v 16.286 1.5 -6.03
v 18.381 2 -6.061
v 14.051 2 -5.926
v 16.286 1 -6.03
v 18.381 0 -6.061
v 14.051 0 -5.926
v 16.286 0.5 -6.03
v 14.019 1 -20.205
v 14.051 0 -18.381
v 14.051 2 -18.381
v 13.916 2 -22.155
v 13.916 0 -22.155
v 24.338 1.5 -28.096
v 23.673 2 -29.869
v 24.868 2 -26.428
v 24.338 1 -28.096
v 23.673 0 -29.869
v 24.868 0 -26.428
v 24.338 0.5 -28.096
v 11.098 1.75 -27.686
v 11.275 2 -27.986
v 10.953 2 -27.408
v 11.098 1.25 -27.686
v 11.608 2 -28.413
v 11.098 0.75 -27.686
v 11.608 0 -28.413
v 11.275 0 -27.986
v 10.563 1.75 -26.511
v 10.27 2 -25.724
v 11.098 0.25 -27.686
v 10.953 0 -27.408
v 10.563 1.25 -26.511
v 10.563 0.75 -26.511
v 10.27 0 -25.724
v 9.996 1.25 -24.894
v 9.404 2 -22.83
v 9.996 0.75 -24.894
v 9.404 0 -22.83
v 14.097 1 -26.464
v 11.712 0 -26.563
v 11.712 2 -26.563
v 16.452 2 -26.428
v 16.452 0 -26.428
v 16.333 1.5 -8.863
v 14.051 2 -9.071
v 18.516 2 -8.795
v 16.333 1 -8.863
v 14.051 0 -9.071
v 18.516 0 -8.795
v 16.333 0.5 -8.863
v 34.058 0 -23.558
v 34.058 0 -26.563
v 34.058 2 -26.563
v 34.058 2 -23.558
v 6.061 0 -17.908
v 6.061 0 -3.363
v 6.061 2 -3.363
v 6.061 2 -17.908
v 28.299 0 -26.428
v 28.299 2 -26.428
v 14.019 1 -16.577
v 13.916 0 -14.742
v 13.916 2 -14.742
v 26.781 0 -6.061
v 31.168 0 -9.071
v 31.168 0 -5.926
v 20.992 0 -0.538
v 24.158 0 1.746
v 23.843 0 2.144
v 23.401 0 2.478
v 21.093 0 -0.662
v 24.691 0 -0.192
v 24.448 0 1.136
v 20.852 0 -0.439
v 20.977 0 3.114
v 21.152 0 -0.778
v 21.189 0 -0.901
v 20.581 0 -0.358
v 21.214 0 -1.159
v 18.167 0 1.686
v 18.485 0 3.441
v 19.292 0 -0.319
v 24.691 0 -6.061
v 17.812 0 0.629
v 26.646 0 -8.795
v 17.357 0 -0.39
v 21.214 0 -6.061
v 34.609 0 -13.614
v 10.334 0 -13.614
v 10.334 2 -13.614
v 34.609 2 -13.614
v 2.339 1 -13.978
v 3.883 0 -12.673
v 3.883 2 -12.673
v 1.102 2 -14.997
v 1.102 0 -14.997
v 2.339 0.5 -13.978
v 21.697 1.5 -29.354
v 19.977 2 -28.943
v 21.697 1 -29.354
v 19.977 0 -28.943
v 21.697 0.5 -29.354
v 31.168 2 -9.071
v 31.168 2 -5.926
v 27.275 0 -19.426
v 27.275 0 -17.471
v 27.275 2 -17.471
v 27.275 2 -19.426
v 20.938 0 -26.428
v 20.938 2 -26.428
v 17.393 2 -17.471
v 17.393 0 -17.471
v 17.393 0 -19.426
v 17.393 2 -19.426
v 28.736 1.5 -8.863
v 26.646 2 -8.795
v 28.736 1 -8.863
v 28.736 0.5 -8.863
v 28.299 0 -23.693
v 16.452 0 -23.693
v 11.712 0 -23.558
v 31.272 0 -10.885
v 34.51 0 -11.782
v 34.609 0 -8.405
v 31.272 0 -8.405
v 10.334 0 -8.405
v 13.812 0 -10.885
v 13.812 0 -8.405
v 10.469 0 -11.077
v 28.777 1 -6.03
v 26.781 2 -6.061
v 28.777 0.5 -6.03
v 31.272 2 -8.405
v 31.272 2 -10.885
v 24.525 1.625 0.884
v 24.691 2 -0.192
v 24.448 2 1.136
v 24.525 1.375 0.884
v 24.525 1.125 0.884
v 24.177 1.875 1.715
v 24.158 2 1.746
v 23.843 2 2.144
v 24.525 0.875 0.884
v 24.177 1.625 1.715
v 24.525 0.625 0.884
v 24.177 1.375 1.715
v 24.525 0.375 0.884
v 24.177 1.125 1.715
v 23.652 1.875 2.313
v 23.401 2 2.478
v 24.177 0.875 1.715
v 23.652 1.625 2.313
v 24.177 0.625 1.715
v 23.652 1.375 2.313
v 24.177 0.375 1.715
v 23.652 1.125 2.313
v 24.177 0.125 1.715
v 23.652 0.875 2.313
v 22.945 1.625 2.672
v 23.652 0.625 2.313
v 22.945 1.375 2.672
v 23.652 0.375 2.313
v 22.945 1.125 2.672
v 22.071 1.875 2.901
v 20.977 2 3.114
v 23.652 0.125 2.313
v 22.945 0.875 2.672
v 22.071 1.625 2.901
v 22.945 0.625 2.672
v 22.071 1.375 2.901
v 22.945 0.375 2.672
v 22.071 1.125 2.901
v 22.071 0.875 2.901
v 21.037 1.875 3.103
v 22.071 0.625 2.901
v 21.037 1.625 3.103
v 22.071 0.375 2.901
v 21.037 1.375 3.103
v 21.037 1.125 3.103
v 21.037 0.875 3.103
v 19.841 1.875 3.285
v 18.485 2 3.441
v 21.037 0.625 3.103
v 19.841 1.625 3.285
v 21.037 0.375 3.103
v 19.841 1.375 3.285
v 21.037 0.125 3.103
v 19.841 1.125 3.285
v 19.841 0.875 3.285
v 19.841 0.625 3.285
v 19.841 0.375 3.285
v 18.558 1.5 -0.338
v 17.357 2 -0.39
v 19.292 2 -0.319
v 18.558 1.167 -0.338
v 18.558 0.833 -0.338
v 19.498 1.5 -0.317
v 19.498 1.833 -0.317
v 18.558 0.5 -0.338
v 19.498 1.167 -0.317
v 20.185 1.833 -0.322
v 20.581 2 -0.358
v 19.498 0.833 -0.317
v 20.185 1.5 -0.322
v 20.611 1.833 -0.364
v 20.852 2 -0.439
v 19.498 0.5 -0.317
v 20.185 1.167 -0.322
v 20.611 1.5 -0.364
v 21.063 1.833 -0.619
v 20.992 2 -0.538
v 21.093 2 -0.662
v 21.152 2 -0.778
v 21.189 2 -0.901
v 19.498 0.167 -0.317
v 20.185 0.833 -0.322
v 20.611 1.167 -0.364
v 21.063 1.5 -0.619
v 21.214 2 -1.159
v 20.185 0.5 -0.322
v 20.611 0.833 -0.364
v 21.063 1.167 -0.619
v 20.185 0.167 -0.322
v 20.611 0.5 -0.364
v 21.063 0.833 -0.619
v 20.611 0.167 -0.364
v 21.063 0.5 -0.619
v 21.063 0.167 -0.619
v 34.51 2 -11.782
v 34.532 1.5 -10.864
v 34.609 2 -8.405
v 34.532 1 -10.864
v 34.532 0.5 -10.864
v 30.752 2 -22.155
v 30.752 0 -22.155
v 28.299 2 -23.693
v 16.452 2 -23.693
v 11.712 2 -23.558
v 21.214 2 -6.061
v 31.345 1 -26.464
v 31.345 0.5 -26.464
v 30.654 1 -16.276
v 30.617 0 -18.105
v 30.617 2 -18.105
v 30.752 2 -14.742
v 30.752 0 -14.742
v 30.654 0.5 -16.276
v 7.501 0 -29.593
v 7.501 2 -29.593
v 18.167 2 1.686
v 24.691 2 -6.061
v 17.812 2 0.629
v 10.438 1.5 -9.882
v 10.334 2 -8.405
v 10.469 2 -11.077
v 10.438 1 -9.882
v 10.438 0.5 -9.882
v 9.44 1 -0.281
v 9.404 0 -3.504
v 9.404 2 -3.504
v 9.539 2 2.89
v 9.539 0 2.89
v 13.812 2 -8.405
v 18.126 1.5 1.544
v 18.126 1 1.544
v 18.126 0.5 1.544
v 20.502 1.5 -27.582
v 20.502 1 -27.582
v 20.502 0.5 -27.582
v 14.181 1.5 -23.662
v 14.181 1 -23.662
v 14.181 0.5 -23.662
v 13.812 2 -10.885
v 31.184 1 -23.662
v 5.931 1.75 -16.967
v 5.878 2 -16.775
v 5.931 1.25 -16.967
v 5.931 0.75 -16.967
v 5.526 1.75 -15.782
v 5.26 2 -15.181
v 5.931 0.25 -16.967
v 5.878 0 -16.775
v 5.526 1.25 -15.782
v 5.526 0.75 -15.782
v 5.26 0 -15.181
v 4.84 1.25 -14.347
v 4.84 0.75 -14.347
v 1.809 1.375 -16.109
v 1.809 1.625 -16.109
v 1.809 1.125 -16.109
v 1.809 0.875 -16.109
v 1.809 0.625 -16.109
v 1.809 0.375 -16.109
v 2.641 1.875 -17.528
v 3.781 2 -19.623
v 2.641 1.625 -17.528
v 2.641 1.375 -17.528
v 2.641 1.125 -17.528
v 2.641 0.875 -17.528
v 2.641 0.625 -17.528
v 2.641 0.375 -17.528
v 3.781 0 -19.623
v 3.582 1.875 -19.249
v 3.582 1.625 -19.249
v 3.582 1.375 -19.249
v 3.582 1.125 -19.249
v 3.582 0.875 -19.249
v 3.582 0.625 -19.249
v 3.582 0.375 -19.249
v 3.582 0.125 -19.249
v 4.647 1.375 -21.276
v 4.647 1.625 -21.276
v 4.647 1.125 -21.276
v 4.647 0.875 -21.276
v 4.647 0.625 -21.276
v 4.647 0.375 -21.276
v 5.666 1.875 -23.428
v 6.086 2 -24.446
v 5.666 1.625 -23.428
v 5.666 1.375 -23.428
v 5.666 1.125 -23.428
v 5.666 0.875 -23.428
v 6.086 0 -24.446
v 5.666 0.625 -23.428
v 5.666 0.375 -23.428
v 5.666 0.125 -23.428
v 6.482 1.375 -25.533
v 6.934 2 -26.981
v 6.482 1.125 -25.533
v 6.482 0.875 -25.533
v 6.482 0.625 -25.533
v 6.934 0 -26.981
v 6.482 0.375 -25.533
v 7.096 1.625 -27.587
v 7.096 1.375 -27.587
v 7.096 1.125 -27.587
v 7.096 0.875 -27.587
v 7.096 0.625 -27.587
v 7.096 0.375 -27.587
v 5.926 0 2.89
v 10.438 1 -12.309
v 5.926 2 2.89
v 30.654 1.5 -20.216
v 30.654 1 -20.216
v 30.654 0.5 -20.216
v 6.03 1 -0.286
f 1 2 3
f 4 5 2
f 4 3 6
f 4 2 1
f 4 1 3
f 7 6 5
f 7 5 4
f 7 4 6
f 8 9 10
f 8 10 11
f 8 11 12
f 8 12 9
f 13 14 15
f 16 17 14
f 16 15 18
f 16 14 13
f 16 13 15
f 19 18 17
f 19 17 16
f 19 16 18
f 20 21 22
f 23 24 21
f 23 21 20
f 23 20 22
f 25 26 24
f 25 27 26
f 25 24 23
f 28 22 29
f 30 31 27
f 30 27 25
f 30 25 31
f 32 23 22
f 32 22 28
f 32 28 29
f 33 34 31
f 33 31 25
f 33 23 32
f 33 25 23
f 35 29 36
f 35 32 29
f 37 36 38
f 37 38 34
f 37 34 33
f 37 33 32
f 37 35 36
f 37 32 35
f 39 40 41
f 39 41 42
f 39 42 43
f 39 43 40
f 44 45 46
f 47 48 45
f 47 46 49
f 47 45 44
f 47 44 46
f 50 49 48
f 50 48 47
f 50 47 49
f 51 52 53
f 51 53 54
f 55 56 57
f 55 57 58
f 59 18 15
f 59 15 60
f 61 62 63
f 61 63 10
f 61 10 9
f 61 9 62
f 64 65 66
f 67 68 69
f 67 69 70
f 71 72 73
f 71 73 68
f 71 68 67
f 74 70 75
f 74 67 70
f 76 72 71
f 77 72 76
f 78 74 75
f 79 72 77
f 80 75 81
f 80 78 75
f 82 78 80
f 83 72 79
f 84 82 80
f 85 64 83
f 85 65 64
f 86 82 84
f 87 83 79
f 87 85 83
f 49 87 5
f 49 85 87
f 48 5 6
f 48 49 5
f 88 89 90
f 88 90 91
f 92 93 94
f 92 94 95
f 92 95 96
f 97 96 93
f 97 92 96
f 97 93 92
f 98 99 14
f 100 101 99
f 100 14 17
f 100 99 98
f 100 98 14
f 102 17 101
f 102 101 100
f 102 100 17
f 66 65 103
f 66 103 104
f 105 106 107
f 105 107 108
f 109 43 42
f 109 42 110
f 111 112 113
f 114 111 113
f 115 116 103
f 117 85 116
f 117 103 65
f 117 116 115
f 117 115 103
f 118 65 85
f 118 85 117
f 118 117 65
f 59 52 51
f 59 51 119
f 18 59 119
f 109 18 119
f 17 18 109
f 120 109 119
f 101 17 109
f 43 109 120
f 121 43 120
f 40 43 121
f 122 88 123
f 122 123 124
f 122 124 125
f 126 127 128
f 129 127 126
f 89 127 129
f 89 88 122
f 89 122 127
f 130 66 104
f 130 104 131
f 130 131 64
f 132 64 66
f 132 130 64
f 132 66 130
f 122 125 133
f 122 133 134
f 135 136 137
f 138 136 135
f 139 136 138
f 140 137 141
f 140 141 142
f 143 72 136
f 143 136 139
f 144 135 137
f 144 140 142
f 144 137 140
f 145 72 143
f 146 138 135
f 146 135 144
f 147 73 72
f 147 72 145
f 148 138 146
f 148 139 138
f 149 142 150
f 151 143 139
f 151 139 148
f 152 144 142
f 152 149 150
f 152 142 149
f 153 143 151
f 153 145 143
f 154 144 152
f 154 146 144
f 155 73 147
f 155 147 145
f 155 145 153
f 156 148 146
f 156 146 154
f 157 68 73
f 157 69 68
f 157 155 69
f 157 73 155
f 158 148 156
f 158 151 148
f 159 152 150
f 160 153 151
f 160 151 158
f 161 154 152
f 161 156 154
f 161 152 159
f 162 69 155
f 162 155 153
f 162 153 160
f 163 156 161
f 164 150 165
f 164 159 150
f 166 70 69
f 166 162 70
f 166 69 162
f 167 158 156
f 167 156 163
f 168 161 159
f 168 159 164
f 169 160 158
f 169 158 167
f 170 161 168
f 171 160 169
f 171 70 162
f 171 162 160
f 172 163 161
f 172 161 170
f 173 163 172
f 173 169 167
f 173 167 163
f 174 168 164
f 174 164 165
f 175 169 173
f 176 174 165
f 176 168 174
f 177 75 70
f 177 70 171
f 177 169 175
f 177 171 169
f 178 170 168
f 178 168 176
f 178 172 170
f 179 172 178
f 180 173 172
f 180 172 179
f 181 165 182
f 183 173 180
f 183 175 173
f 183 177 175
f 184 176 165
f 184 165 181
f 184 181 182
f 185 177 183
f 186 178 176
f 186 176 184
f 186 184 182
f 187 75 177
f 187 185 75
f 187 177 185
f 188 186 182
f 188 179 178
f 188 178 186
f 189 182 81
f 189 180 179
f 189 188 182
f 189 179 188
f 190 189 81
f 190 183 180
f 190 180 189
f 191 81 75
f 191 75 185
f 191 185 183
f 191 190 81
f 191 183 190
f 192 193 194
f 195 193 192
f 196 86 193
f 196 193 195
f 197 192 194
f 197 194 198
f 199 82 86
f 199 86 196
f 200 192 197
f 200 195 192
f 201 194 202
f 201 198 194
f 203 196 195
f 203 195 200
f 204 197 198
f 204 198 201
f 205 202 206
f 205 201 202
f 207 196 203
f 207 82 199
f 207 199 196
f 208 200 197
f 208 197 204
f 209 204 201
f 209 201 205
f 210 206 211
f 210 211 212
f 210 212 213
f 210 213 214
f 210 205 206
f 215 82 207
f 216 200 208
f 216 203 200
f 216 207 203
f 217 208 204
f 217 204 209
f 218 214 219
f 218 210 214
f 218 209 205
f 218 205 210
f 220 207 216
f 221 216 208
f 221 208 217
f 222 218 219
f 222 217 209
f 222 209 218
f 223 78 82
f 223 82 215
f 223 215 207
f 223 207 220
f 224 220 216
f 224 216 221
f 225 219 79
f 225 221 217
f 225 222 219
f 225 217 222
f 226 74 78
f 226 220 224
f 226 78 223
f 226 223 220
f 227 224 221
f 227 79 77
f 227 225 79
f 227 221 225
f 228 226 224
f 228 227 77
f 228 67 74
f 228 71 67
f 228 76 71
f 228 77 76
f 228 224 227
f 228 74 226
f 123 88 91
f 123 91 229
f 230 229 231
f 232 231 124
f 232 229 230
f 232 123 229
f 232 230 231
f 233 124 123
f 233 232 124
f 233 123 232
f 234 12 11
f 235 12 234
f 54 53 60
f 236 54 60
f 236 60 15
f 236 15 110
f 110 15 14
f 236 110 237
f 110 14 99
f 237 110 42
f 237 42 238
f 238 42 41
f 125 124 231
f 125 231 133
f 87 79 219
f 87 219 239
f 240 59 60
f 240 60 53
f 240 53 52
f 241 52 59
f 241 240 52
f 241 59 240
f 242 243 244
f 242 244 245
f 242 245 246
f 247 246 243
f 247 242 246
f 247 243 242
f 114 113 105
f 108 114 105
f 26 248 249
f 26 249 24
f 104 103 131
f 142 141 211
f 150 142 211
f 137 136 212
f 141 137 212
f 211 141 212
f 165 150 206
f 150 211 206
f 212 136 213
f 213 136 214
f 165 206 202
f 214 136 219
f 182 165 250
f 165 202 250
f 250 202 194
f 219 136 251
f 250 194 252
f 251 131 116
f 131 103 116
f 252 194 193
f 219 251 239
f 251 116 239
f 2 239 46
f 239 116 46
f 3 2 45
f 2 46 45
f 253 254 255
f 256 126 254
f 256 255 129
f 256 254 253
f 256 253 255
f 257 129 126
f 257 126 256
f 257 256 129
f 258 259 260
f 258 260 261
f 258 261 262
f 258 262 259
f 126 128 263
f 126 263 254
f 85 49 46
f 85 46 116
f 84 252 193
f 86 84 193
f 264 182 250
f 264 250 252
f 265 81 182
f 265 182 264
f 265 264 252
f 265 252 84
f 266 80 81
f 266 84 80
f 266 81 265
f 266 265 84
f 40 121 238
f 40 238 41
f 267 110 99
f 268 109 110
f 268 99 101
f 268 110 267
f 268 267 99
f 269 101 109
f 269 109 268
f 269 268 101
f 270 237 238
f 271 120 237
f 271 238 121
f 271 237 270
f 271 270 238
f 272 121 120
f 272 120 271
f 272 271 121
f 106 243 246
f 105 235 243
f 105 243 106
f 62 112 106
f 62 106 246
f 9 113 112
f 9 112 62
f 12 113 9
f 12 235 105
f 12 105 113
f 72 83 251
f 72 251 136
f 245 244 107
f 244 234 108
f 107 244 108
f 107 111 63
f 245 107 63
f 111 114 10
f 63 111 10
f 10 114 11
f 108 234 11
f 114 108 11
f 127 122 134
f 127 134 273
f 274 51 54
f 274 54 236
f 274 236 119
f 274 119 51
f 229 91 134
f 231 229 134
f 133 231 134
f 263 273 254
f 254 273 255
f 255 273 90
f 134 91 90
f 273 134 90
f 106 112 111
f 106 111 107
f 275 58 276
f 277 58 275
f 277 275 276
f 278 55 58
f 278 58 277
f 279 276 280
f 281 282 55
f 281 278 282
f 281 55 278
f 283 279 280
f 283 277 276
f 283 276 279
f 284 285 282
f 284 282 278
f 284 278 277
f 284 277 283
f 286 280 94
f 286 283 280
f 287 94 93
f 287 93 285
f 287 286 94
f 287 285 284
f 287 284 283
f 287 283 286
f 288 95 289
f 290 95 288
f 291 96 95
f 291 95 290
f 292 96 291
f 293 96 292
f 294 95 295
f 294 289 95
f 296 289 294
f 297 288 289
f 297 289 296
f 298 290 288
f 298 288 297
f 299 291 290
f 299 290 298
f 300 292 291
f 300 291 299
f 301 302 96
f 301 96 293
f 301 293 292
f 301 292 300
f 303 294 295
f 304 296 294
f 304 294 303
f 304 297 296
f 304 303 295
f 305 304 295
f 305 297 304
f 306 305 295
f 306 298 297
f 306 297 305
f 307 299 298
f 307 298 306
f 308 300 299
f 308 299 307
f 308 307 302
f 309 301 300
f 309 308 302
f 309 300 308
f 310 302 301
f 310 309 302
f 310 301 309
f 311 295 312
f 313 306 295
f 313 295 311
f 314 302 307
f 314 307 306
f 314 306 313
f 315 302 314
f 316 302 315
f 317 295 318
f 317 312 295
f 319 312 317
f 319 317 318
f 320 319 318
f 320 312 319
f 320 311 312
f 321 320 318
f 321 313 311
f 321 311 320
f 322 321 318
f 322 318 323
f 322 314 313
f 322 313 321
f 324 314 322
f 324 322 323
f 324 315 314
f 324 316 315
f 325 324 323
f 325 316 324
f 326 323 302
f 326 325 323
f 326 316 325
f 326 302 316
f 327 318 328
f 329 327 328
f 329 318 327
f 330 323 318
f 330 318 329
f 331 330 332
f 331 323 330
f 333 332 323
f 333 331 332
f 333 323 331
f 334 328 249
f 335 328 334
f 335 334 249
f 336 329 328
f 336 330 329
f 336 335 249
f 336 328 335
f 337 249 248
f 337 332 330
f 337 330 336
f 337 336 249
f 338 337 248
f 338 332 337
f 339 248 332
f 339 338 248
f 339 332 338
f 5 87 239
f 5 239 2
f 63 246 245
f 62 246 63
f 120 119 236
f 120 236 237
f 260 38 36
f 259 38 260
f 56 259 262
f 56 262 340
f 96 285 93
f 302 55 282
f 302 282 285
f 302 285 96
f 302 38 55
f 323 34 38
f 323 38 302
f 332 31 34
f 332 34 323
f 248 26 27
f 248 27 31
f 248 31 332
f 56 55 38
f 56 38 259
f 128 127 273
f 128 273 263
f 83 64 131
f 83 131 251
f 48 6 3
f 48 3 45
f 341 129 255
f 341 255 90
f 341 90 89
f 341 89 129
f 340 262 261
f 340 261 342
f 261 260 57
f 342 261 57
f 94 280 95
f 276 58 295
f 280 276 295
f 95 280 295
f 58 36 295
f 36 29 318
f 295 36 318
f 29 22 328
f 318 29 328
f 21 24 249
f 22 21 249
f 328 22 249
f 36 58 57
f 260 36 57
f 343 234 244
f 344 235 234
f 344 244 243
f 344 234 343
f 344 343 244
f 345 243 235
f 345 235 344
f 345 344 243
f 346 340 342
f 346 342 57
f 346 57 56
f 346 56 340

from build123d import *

# Parameters (mm, degrees)
SKETCH_1_W        = 9.88174139
SKETCH_1_H        = 1.95451592
EXTRUDE_1_DEPTH   = 2
EXTRUDE_1_2_DEPTH = 2
EXTRUDE_1_3_DEPTH = 2
EXTRUDE_1_4_DEPTH = 2
EXTRUDE_1_5_DEPTH = 2


with BuildPart() as part:
    # 草图1 → 凸台-拉伸1 (new body)
    with BuildSketch(Plane(origin=(0, 0, 0), x_dir=(1, 0, 0), z_dir=(0, 1, 0))):
        with BuildLine():
            add(Edge.make_bspline(
                [(30.752436647, 22.154645874), (30.73216565, 21.837622414), (30.690867567, 21.191750823), (30.650674713, 20.200398996), (30.624042271, 19.167568844), (30.619565925, 18.463954972), (30.617283951, 18.105263158)],
                knots=[0, 0, 0, 0, 0.940672631, 1.916431444, 2.937827954, 4, 4, 4, 4], degree=3))
            add(Edge.make_bspline(
                [(30.617283951, 18.105263158), (30.619485556, 17.788152365), (30.623721106, 17.178079977), (30.649991291, 16.301153107), (30.689389604, 15.496773518), (30.732035439, 14.986262208), (30.752436647, 14.742040286)],
                knots=[0, 0, 0, 0, 1.130183773, 2.174299741, 3.126608915, 4, 4, 4, 4], degree=3))
            Line((30.752436647, 14.742040286), (13.915529565, 14.742040286))
            add(Edge.make_bspline(
                [(13.915529565, 14.742040286), (13.956255794, 15.353468465), (14.036957897, 16.565059618), (14.046135918, 17.779294289), (14.050682261, 18.380766732)],
                knots=[0, 0, 0, 0, 1.009297861, 2, 2, 2, 2], degree=3))
            add(Edge.make_bspline(
                [(14.050682261, 18.380766732), (14.045600336, 18.989140946), (14.035082083, 20.248316282), (13.956265623, 21.505087377), (13.915529565, 22.154645874)],
                knots=[0, 0, 0, 0, 0.966305797, 2, 2, 2, 2], degree=3))
            Line((13.915529565, 22.154645874), (30.752436647, 22.154645874))
        make_face()
        with Locations((22.333983106, 18.44834308)):
            Rectangle(SKETCH_1_W, SKETCH_1_H, mode=Mode.SUBTRACT)
    extrude(amount=EXTRUDE_1_DEPTH)


with BuildPart() as body_2:
    # 草图1 → Extrude 1 2 (new body)
    with BuildSketch(Plane(origin=(0, 0, 0), x_dir=(1, 0, 0), z_dir=(0, 1, 0))):
        with BuildLine():
            add(Edge.make_bspline(
                [(11.607537362, 28.413255361), (11.521542323, 28.313099671), (11.327923123, 28.087597541), (11.076918098, 27.65935085), (10.811135115, 27.126477181), (10.546157248, 26.479367048), (10.265160581, 25.725940356), (9.980406671, 24.860307783), (9.691689727, 23.883248871), (9.502730954, 23.192907405), (9.403508772, 22.830409357)],
                knots=[0, 0, 0, 0, 0.523456493, 1.178570636, 1.963415983, 2.888813059, 3.953691545, 5.157215534, 6.507254928, 8, 8, 8, 8], degree=3))
            Line((9.403508772, 22.830409357), (9.403508772, 3.503573749))
            add(Edge.make_bspline(
                [(9.403508772, 3.503573749), (9.410266068, 2.429169112), (9.423674472, 0.297243697), (9.500535371, -1.833335456), (9.538661468, -2.890188434)],
                knots=[0, 0, 0, 0, 1.007919536, 2, 2, 2, 2], degree=3))
            Line((9.538661468, -2.890188434), (5.925925926, -2.890188434))
            add(Edge.make_bspline(
                [(5.925925926, -2.890188434), (5.966656183, -1.831622522), (6.046831028, 0.252095156), (6.056380469, 2.337326439), (6.061078622, 3.363222872)],
                knots=[0, 0, 0, 0, 1.016035831, 2, 2, 2, 2], degree=3))
            Line((6.061078622, 3.363222872), (6.061078622, 17.907732294))
            add(Edge.make_bspline(
                [(6.061078622, 17.907732294), (6.054446784, 17.760031814), (6.040198533, 17.442702988), (5.932875038, 16.939003937), (5.756161218, 16.378771824), (5.522148965, 15.752337902), (5.212198692, 15.066272423), (4.830354437, 14.321780096), (4.388784833, 13.511648511), (4.056802228, 12.961247126), (3.883040936, 12.673164392)],
                knots=[0, 0, 0, 0, 0.619094777, 1.330101432, 2.150575959, 3.081708728, 4.132179584, 5.305151966, 6.589503572, 8, 8, 8, 8], degree=3))
            add(Edge.make_bspline(
                [(3.883040936, 12.673164392), (3.61276359, 12.901918393), (3.098459777, 13.337208501), (2.36679578, 13.955572674), (1.712075511, 14.503845986), (1.296514497, 14.839602725), (1.102014295, 14.996751137)],
                knots=[0, 0, 0, 0, 1.172450442, 2.231025808, 3.172044959, 4, 4, 4, 4], degree=3))
            add(Edge.make_bspline(
                [(1.102014295, 14.996751137), (1.21531554, 15.16959098), (1.456199164, 15.537056383), (1.825244862, 16.131581324), (2.224973102, 16.80258347), (2.654969783, 17.549329432), (3.113766194, 18.371756588), (3.594890024, 19.274208026), (4.115048488, 20.247738691), (4.653465803, 21.281544176), (5.185718362, 22.344216921), (5.667164033, 23.417493406), (6.106904055, 24.47439099), (6.485086103, 25.523657296), (6.819621795, 26.556082101), (7.100785324, 27.577538036), (7.333166893, 28.586526237), (7.445412966, 29.259915409), (7.500974659, 29.593242365)],
                knots=[0, 0, 0, 0, 0.618227761, 1.314380472, 2.093112693, 2.954648851, 3.892101542, 4.910205721, 6.013985109, 7.194057854, 8.397175083, 9.5687473, 10.712315215, 11.82078272, 12.904330774, 13.958148685, 14.989285673, 16, 16, 16, 16], degree=3))
            Line((7.500974659, 29.593242365), (11.607537362, 28.413255361))
        make_face()
    extrude(amount=EXTRUDE_1_2_DEPTH)


with BuildPart() as body_3:
    # 草图1 → Extrude 1 3 (new body)
    with BuildSketch(Plane(origin=(0, 0, 0), x_dir=(1, 0, 0), z_dir=(0, 1, 0))):
        with BuildLine():
            add(Edge.make_bspline(
                [(26.645873944, 8.795321637), (26.978614485, 8.798309179), (27.675657914, 8.804567647), (28.762524405, 8.859765502), (29.937366391, 8.949624727), (30.74738061, 9.029381121), (31.168291098, 9.070825211)],
                knots=[0, 0, 0, 0, 0.880852809, 1.845259559, 2.88032478, 4, 4, 4, 4], degree=3))
            Line((31.168291098, 9.070825211), (31.168291098, 5.925925926))
            add(Edge.make_bspline(
                [(31.168291098, 5.925925926), (30.75244187, 5.944949905), (29.955478765, 5.981408813), (28.808724937, 6.034436913), (27.761793894, 6.051230537), (27.096381762, 6.057912077), (26.781026641, 6.061078622)],
                knots=[0, 0, 0, 0, 1.137978811, 2.180903712, 3.137885676, 4, 4, 4, 4], degree=3))
            Line((26.781026641, 6.061078622), (24.691358025, 6.061078622))
            Line((24.691358025, 6.061078622), (24.691358025, 0.192332684))
            add(Edge.make_bspline(
                [(24.691358025, 0.192332684), (24.674052596, 0.003016451), (24.64096282, -0.358975849), (24.538743939, -0.870597487), (24.390274776, -1.323140375), (24.190406787, -1.713181835), (23.94974424, -2.047884975), (23.660371455, -2.323801853), (23.320936211, -2.53361144), (22.938429345, -2.683331465), (22.515645079, -2.788633753), (22.060190664, -2.908217023), (21.561251132, -3.007774873), (21.022666365, -3.108627995), (20.445059899, -3.199186238), (19.827073029, -3.291045153), (19.169291141, -3.364535049), (18.716908791, -3.415195081), (18.484730344, -3.441195582)],
                knots=[0, 0, 0, 0, 1.123072812, 2.147431872, 3.076932964, 3.928891422, 4.727797385, 5.502981353, 6.275929502, 7.070886977, 7.920626468, 8.84961962, 9.853917622, 10.926593922, 12.088365901, 13.309345055, 14.619061764, 16, 16, 16, 16], degree=3))
            add(Edge.make_bspline(
                [(18.484730344, -3.441195582), (18.447772235, -3.126496661), (18.372547469, -2.485956507), (18.137072938, -1.52866004), (17.805162276, -0.559932353), (17.508484903, 0.068434331), (17.356725146, 0.389863548)],
                knots=[0, 0, 0, 0, 0.945914169, 1.925319627, 2.938736085, 4, 4, 4, 4], degree=3))
            add(Edge.make_bspline(
                [(17.356725146, 0.389863548), (17.56808733, 0.378740031), (17.968188494, 0.357683607), (18.536682733, 0.338887253), (19.039092032, 0.320682177), (19.477565779, 0.316592012), (19.851893774, 0.316400558), (20.162126425, 0.319430227), (20.409065349, 0.333019925), (20.642304845, 0.364960025), (20.877324162, 0.428743953), (21.078569545, 0.611421917), (21.200524927, 0.864153535), (21.209114633, 1.055418828), (21.213775179, 1.159194282)],
                knots=[0, 0, 0, 0, 1.74879159, 3.310400848, 4.699819061, 5.902536763, 6.933364607, 7.792507111, 8.466778008, 8.972962285, 9.742628753, 10.432229362, 11.149369409, 12, 12, 12, 12], degree=3))
            Line((21.213775179, 1.159194282), (21.213775179, 6.061078622))
            Line((21.213775179, 6.061078622), (18.380766732, 6.061078622))
            add(Edge.make_bspline(
                [(18.380766732, 6.061078622), (18.037688866, 6.05796704), (17.339354629, 6.051633422), (16.273333377, 6.035251169), (15.173295608, 5.983312344), (14.428397417, 5.945234195), (14.050682261, 5.925925926)],
                knots=[0, 0, 0, 0, 0.950238572, 1.934208509, 2.952500133, 4, 4, 4, 4], degree=3))
            Line((14.050682261, 5.925925926), (14.050682261, 9.070825211))
            add(Edge.make_bspline(
                [(14.050682261, 9.070825211), (14.435157731, 9.029005521), (15.194593814, 8.946401079), (16.324656519, 8.858001123), (17.428951949, 8.803670785), (18.157185557, 8.798077122), (18.515919428, 8.795321637)],
                knots=[0, 0, 0, 0, 1.036747421, 2.047837798, 3.038348828, 4, 4, 4, 4], degree=3))
            Line((18.515919428, 8.795321637), (26.645873944, 8.795321637))
        make_face()
    extrude(amount=EXTRUDE_1_3_DEPTH)


with BuildPart() as body_4:
    # 草图1 → Extrude 1 4 (new body)
    with BuildSketch(Plane(origin=(0, 0, 0), x_dir=(1, 0, 0), z_dir=(0, 1, 0))):
        with BuildLine():
            add(Edge.make_bspline(
                [(34.60948668, 13.614035088), (34.569631585, 13.143050758), (34.492198913, 12.227996483), (34.522408867, 10.887416718), (34.598335958, 9.624329928), (34.605839606, 8.804115246), (34.60948668, 8.40545809)],
                knots=[0, 0, 0, 0, 1.087231053, 2.112332324, 3.082517973, 4, 4, 4, 4], degree=3))
            Line((34.60948668, 8.40545809), (31.272254711, 8.40545809))
            Line((31.272254711, 8.40545809), (31.272254711, 10.884990253))
            Line((31.272254711, 10.884990253), (13.811565952, 10.884990253))
            Line((13.811565952, 10.884990253), (13.811565952, 8.40545809))
            Line((13.811565952, 8.40545809), (10.333983106, 8.40545809))
            add(Edge.make_bspline(
                [(10.333983106, 8.40545809), (10.352948484, 8.663630337), (10.389088662, 9.155600013), (10.442196382, 9.858561772), (10.459194504, 10.491588156), (10.465959712, 10.890189788), (10.469135802, 11.077322937)],
                knots=[0, 0, 0, 0, 1.160906096, 2.212207559, 3.160677723, 4, 4, 4, 4], degree=3))
            add(Edge.make_bspline(
                [(10.469135802, 11.077322937), (10.464130171, 11.488262006), (10.453808118, 12.335654606), (10.374718556, 13.179439647), (10.333983106, 13.614035088)],
                knots=[0, 0, 0, 0, 0.969890625, 2, 2, 2, 2], degree=3))
            Line((10.333983106, 13.614035088), (34.60948668, 13.614035088))
        make_face()
    extrude(amount=EXTRUDE_1_4_DEPTH)


with BuildPart() as body_5:
    # 草图1 → Extrude 1 5 (new body)
    with BuildSketch(Plane(origin=(0, 0, 0), x_dir=(1, 0, 0), z_dir=(0, 1, 0))):
        with BuildLine():
            add(Edge.make_bspline(
                [(23.67251462, 29.868745939), (23.789853619, 29.569461312), (24.020237528, 28.981844556), (24.338018683, 28.10910085), (24.619394923, 27.261054219), (24.786282718, 26.701742091), (24.868096166, 26.427550357)],
                knots=[0, 0, 0, 0, 1.058463999, 2.078192886, 3.057871984, 4, 4, 4, 4], degree=3))
            Line((24.868096166, 26.427550357), (28.298895387, 26.427550357))
            add(Edge.make_bspline(
                [(28.298895387, 26.427550357), (28.820458839, 26.429792654), (29.83592653, 26.434158334), (31.31749475, 26.460826088), (32.716002289, 26.500404282), (33.620149275, 26.542361974), (34.058479532, 26.562703054)],
                knots=[0, 0, 0, 0, 1.086266147, 2.114926136, 3.086116612, 4, 4, 4, 4], degree=3))
            Line((34.058479532, 26.562703054), (34.058479532, 23.558154646))
            add(Edge.make_bspline(
                [(34.058479532, 23.558154646), (33.100423962, 23.598872398), (31.181419953, 23.68043085), (29.260702059, 23.689010867), (28.298895387, 23.693307342)],
                knots=[0, 0, 0, 0, 0.998492516, 2, 2, 2, 2], degree=3))
            Line((28.298895387, 23.693307342), (16.452241715, 23.693307342))
            add(Edge.make_bspline(
                [(16.452241715, 23.693307342), (16.081439809, 23.690195502), (15.324196243, 23.68384057), (14.162914113, 23.667310478), (12.953704588, 23.615223235), (12.130805389, 23.577418083), (11.711500975, 23.558154646)],
                knots=[0, 0, 0, 0, 0.938155192, 1.915880067, 2.938046497, 4, 4, 4, 4], degree=3))
            Line((11.711500975, 23.558154646), (11.711500975, 26.562703054))
            add(Edge.make_bspline(
                [(11.711500975, 26.562703054), (12.506675075, 26.524589671), (14.086050958, 26.448888818), (15.667172945, 26.434630158), (16.452241715, 26.427550357)],
                knots=[0, 0, 0, 0, 1.006947249, 2, 2, 2, 2], degree=3))
            Line((16.452241715, 26.427550357), (20.938271605, 26.427550357))
            add(Edge.make_bspline(
                [(20.938271605, 26.427550357), (20.869047408, 26.611251641), (20.724019476, 26.996114424), (20.494855563, 27.598933852), (20.246521426, 28.255028931), (20.068925554, 28.708005059), (19.976608187, 28.943469786)],
                knots=[0, 0, 0, 0, 0.874609537, 1.832347895, 2.873217421, 4, 4, 4, 4], degree=3))
            add(Edge.make_bspline(
                [(19.976608187, 28.943469786), (20.254044541, 29.006736773), (20.82895339, 29.137839819), (21.72067613, 29.359043494), (22.675782468, 29.602044012), (23.333088149, 29.777923451), (23.67251462, 29.868745939)],
                knots=[0, 0, 0, 0, 0.896174117, 1.857068916, 2.893410544, 4, 4, 4, 4], degree=3))
        make_face()
    extrude(amount=EXTRUDE_1_5_DEPTH)


solid = Compound([part.part, body_2.part, body_3.part, body_4.part, body_5.part])
